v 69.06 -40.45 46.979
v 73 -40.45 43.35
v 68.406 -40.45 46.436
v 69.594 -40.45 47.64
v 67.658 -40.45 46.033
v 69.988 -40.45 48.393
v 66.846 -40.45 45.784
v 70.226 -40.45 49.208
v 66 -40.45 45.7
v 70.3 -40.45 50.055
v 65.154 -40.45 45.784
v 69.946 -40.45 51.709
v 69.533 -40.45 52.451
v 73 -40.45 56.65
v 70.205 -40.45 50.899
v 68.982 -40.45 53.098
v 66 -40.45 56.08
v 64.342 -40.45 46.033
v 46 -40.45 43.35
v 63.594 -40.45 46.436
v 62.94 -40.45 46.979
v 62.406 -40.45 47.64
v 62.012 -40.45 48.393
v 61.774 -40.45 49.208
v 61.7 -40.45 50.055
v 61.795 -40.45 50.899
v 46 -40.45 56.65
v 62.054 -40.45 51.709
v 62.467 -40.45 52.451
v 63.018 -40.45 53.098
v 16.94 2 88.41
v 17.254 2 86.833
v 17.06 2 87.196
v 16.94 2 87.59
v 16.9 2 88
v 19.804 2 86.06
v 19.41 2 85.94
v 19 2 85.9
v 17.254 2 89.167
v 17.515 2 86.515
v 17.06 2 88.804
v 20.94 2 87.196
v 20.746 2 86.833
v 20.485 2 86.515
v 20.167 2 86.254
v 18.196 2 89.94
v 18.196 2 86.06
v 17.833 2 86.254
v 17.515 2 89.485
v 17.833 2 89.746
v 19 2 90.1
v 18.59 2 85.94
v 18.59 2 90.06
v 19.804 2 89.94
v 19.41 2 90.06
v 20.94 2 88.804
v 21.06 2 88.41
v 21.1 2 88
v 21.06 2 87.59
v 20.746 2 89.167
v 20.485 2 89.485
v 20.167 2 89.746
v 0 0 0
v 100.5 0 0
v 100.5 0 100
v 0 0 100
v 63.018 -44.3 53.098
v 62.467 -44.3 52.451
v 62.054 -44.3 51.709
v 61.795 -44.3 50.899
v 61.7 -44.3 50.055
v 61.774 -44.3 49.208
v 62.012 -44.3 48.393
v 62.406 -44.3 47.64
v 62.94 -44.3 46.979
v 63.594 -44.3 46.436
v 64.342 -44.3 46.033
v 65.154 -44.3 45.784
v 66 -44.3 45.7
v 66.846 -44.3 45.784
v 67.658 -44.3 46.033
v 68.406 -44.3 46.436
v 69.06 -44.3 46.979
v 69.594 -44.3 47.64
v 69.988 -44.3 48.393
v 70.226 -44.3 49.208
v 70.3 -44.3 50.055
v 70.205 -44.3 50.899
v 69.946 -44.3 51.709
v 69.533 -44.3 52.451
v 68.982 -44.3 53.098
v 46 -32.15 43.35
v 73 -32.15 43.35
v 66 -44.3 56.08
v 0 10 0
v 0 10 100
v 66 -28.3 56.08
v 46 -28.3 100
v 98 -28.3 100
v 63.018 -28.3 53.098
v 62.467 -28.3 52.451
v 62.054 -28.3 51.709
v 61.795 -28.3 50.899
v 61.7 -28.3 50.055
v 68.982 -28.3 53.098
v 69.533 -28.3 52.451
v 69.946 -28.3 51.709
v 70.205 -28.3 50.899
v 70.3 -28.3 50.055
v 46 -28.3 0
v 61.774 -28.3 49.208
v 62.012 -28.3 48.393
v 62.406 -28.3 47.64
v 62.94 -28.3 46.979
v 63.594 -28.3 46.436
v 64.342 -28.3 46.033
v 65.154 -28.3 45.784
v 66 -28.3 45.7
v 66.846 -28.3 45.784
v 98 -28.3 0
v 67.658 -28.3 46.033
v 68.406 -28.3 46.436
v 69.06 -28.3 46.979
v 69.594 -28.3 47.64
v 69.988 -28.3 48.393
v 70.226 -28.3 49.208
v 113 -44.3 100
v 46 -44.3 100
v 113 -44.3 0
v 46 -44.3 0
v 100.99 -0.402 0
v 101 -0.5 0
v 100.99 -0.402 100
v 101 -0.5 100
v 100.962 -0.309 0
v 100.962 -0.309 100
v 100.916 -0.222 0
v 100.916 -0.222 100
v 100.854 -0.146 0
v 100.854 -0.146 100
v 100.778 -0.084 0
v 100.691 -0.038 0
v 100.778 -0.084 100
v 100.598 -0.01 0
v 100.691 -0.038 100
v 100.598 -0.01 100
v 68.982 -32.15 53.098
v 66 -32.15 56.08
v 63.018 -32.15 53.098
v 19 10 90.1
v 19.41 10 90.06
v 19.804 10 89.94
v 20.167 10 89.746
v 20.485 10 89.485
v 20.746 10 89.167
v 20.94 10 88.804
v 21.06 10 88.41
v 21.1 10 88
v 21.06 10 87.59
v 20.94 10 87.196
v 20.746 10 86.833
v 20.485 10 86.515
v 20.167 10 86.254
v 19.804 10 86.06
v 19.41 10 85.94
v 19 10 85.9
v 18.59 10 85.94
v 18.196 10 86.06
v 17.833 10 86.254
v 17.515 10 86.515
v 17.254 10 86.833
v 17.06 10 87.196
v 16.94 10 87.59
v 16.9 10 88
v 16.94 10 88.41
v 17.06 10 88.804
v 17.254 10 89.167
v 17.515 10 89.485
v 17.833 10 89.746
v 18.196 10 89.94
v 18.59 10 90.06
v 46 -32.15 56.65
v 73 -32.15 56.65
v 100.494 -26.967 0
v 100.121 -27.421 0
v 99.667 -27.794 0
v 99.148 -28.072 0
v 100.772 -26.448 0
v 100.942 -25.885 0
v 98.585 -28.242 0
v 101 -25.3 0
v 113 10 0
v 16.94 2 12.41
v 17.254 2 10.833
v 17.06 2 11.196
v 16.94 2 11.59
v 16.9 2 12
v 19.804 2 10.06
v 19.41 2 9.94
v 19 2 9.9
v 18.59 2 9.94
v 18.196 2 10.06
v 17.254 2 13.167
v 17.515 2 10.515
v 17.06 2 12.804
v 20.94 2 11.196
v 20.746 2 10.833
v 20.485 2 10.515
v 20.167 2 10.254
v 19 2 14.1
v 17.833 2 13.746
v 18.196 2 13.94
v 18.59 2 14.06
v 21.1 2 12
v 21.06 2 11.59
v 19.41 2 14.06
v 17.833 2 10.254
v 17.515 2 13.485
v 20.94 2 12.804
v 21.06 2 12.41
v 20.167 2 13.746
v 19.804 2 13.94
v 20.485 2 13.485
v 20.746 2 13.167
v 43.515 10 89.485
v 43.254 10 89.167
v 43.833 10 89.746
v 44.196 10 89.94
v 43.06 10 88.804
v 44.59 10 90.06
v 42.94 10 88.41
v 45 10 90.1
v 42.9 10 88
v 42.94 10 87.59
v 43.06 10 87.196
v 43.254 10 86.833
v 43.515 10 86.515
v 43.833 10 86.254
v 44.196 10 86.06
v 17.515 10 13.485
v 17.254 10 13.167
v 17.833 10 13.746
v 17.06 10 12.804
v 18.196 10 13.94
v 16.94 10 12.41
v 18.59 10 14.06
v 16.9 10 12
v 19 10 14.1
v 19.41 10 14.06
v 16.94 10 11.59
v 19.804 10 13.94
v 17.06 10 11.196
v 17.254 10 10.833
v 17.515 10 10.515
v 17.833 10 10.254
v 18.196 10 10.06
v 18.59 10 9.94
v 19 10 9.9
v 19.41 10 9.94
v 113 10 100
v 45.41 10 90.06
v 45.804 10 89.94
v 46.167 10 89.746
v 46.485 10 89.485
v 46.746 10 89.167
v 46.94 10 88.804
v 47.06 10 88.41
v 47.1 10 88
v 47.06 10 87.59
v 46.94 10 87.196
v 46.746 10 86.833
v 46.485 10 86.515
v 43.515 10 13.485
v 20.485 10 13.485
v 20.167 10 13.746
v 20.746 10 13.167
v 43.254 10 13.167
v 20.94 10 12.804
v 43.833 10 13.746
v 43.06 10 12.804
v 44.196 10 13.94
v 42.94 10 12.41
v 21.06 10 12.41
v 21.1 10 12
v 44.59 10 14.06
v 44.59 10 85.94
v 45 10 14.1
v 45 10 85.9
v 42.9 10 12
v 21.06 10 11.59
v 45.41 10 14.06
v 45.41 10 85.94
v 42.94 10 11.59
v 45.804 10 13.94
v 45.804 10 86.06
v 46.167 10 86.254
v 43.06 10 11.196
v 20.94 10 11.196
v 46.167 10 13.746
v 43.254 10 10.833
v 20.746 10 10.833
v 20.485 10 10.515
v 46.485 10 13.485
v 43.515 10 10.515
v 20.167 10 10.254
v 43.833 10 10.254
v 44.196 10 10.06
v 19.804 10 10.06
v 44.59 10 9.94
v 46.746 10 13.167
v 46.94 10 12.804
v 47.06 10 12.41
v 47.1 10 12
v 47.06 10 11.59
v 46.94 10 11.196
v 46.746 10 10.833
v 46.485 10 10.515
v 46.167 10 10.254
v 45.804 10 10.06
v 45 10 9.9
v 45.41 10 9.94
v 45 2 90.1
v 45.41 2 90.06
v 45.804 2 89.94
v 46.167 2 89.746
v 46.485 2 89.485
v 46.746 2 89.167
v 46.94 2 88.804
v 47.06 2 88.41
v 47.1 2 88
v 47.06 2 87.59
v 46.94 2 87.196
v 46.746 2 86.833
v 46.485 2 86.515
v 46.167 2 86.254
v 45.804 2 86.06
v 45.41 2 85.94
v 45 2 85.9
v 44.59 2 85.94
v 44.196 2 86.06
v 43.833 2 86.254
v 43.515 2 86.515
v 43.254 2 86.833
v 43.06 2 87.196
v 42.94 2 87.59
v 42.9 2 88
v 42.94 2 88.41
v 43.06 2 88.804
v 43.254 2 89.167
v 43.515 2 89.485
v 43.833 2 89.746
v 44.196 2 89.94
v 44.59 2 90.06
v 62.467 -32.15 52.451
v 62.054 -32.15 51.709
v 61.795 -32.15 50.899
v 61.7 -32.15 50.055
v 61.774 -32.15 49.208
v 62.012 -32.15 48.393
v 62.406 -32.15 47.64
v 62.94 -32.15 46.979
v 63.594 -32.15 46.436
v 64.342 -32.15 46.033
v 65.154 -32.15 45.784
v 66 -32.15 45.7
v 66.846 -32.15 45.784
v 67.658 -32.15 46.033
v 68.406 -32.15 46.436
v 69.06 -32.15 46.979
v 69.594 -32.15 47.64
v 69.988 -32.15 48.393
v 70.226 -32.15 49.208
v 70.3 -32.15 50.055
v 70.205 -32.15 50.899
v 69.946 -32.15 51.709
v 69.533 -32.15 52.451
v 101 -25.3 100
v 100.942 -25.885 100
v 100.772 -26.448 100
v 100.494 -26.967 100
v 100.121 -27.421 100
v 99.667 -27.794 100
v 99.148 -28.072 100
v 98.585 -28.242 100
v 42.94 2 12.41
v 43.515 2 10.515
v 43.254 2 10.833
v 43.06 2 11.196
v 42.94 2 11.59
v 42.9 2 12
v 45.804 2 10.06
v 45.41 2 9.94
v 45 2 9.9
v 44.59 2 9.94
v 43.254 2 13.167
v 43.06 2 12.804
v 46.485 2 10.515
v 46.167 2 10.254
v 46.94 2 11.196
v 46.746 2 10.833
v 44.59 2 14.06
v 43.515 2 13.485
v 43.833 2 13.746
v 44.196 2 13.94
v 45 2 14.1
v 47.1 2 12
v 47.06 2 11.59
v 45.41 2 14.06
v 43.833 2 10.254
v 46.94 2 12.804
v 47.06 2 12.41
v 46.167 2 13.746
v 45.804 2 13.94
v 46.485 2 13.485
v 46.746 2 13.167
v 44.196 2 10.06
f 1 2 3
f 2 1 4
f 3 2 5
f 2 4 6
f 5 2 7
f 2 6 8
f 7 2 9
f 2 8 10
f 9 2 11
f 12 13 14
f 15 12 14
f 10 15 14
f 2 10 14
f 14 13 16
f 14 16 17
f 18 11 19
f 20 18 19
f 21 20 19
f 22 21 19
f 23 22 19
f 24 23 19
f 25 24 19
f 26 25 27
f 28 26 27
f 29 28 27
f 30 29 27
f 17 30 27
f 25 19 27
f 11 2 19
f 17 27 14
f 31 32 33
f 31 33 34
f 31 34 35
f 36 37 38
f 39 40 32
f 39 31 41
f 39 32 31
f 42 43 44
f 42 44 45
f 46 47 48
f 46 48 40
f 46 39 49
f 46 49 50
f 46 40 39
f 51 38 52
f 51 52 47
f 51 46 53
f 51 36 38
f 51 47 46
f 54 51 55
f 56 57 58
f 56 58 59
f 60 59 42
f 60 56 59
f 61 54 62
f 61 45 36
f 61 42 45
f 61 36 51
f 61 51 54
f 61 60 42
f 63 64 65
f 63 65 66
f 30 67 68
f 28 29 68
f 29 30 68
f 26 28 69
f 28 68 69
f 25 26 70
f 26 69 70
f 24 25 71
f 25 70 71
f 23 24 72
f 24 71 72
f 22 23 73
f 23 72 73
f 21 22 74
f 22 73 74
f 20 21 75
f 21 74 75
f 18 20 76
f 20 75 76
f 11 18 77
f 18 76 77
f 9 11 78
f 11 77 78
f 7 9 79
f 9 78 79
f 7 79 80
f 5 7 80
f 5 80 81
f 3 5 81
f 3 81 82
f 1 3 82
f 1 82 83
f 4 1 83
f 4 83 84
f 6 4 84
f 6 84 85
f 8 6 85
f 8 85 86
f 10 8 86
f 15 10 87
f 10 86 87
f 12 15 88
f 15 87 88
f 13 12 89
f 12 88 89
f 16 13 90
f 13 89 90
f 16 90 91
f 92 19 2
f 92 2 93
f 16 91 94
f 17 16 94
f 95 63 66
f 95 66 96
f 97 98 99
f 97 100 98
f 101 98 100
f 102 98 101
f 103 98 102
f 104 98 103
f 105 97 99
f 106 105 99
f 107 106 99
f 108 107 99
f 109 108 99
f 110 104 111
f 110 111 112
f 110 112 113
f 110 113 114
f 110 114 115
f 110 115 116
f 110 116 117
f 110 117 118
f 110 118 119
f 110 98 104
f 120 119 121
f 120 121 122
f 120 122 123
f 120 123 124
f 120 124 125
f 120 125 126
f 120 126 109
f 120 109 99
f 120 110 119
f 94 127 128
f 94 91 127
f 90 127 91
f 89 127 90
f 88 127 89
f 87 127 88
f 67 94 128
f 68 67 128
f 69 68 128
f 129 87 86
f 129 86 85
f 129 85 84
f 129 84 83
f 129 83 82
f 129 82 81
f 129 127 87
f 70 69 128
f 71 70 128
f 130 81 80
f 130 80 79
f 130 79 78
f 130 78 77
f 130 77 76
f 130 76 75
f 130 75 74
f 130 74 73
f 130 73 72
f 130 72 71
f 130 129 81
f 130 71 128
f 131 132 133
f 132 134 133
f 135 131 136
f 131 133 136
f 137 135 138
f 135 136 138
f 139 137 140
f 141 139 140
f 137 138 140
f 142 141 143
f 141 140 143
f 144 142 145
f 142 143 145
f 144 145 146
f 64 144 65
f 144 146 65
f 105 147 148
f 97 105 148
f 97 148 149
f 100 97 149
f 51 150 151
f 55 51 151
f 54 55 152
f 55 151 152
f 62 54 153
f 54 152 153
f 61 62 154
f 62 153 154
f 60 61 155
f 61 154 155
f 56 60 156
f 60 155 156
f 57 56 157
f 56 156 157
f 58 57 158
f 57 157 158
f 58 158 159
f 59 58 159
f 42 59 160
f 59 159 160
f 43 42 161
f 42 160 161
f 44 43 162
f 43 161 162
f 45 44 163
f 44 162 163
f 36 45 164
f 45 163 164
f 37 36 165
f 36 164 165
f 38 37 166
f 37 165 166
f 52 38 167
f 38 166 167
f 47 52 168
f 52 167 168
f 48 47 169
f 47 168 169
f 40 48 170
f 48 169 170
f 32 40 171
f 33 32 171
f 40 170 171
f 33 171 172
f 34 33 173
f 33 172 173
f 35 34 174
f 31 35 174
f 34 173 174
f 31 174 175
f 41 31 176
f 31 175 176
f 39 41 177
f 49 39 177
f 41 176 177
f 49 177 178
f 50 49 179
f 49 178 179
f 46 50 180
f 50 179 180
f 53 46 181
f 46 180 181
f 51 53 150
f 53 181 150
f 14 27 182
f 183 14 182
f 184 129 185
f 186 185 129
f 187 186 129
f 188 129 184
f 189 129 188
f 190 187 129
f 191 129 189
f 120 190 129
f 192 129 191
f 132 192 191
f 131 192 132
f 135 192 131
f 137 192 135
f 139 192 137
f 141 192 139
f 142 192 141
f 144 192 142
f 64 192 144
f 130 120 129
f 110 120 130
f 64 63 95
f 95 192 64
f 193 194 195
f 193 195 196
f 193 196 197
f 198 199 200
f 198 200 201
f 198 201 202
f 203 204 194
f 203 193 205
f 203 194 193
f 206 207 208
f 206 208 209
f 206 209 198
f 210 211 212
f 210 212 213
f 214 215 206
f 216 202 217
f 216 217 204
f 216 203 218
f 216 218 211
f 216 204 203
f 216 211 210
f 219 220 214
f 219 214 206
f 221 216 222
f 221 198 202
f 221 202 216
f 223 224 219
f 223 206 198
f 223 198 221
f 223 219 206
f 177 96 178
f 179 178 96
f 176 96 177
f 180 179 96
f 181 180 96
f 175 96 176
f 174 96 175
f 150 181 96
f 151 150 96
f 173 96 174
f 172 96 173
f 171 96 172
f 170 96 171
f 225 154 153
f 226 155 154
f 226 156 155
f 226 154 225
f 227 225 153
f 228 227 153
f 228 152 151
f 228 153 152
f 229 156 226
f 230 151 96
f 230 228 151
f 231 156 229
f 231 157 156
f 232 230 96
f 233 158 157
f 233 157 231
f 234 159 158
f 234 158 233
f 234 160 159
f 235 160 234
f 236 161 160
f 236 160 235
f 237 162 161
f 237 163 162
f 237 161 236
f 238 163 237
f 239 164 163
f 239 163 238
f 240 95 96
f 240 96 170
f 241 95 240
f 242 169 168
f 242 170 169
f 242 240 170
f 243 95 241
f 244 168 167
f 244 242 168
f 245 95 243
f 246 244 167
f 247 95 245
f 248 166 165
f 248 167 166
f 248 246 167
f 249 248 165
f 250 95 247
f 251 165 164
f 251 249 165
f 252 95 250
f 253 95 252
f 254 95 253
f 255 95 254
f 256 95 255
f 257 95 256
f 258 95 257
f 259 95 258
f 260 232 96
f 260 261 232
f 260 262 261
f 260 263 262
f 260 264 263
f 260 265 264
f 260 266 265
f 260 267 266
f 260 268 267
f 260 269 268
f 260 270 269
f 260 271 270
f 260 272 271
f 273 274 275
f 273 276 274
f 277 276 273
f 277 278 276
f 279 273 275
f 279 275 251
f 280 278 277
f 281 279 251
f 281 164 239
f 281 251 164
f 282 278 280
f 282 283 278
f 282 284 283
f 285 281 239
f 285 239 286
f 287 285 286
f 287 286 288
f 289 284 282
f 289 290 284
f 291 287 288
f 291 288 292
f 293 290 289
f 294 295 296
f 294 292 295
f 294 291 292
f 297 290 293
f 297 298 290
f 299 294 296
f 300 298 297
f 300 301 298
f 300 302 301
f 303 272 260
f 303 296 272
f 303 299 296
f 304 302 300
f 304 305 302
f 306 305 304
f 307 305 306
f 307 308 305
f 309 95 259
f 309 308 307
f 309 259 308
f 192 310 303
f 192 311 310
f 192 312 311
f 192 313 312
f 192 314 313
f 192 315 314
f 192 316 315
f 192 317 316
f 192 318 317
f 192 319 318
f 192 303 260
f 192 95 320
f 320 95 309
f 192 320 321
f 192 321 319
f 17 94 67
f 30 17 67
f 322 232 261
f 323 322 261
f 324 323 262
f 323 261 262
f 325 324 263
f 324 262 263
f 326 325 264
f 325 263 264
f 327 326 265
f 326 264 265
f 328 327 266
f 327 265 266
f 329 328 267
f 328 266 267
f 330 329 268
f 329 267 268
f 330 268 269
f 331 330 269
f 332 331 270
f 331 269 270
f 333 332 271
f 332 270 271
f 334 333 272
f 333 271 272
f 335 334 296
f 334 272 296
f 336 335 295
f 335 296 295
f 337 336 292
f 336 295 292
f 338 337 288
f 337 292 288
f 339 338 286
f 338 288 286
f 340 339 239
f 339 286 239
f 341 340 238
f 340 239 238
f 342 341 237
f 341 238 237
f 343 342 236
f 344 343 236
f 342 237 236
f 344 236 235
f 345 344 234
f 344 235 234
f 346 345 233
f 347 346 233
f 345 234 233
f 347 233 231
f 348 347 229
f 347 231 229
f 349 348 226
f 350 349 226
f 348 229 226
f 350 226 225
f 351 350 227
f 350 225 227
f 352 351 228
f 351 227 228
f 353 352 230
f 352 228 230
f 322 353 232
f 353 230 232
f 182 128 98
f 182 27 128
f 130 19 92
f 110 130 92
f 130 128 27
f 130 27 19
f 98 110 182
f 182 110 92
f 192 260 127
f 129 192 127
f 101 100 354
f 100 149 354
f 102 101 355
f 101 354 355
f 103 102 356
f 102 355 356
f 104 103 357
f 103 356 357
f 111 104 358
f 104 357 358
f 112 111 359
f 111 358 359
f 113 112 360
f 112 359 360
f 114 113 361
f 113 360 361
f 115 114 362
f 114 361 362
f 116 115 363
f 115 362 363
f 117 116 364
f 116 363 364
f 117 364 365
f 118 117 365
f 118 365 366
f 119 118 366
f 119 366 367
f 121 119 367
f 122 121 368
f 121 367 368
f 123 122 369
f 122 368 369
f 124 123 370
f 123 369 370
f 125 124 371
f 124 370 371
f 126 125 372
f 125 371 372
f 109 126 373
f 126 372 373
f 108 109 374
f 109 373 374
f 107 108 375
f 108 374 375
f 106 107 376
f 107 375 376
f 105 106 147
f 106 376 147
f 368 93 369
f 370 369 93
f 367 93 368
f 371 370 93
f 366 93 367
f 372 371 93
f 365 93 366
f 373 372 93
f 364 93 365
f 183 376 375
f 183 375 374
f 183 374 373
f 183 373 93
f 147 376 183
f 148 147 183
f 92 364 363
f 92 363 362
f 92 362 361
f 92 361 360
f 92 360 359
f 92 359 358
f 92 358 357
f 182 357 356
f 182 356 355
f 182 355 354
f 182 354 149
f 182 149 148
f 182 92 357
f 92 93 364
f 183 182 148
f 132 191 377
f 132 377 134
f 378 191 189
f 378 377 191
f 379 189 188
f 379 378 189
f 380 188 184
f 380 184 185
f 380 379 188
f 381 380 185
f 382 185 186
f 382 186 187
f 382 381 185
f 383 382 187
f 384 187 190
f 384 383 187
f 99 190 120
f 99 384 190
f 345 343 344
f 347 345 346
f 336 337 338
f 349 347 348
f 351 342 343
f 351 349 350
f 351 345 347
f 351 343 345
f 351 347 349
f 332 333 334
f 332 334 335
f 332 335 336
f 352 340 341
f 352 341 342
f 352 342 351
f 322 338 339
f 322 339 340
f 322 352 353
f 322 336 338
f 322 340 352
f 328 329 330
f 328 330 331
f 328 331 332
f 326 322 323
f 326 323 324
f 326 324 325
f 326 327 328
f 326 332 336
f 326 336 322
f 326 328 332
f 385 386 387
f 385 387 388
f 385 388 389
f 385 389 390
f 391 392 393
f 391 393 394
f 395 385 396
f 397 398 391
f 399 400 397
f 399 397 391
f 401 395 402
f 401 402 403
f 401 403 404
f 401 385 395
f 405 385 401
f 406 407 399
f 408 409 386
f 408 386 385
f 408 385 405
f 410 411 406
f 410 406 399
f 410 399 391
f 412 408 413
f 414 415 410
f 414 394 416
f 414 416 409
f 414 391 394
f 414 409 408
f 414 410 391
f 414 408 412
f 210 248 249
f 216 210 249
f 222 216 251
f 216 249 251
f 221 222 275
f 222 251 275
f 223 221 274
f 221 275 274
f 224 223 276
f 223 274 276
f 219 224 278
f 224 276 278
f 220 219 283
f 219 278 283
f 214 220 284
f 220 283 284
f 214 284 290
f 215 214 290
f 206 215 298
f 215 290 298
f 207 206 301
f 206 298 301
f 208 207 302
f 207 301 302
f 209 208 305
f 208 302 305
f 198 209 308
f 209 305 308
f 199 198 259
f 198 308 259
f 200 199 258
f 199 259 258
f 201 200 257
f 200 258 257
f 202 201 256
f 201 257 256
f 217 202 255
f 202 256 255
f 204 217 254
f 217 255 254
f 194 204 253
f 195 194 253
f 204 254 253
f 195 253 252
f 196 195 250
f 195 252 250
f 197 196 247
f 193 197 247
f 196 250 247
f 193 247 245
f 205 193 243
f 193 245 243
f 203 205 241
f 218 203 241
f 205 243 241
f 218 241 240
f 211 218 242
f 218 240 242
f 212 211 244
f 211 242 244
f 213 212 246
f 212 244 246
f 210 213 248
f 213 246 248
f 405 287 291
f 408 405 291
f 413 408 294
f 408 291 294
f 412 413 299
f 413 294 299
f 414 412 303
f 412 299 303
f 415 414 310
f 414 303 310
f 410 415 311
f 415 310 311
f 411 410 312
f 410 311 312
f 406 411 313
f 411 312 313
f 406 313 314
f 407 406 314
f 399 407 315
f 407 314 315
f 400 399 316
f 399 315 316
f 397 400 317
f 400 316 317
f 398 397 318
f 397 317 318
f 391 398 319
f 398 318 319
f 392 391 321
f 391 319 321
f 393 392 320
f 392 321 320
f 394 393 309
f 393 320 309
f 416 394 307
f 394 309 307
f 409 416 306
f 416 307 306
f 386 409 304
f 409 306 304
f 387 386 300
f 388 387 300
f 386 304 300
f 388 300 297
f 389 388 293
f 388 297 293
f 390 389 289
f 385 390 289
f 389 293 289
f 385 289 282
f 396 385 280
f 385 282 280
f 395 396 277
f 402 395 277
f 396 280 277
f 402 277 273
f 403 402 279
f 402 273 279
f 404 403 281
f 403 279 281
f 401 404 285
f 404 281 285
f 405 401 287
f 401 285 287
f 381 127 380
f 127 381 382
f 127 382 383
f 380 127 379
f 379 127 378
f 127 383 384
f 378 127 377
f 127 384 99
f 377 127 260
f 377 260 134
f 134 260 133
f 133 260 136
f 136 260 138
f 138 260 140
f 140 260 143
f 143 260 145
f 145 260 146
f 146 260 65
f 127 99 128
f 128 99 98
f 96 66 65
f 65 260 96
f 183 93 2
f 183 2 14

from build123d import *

# Parameters (mm, degrees)
BOSS_EXTRUDE1_DEPTH = 100
SKETCH4_R           = 4.3
CUT_EXTRUDE1_DEPTH  = 16
SKETCH5_W           = 13.3
SKETCH5_H           = 8.3
CUT_EXTRUDE2_DEPTH  = 27
SKETCH3_R           = 2.1
CUT_EXTRUDE3_DEPTH  = 8
CUT_EXTRUDE4_DEPTH  = 16
FILLET1_R           = 3
FILLET2_R           = 0.5


with BuildPart() as part:
    # Sketch1 → Boss-Extrude1 (new body)
    with BuildSketch(Plane.XY):
        Polygon((0, 0), (0, 10), (113, 10), (113, -44.3), (46, -44.3), (46, -28.3), (101, -28.3), (101, 0), align=None)
    extrude(amount=BOSS_EXTRUDE1_DEPTH)

    # Sketch4 → Cut-Extrude1 (cut)
    with BuildSketch(Plane.XZ.offset(44.3)):
        with Locations((66, 50)):
            Circle(SKETCH4_R)
    extrude(amount=-CUT_EXTRUDE1_DEPTH, mode=Mode.SUBTRACT)

    # Sketch5 → Cut-Extrude2 (cut)
    with BuildSketch(Plane.ZY.offset(-46)):
        with Locations((50, -36.3)):
            Rectangle(SKETCH5_W, SKETCH5_H)
    extrude(amount=-CUT_EXTRUDE2_DEPTH, mode=Mode.SUBTRACT)

    # Sketch3 → Cut-Extrude3 (cut)
    with BuildSketch(Plane(origin=(0, 10, 0), x_dir=(1, 0, 0), z_dir=(0, 1, 0))):
        with Locations(Location((19, -12, 0), (0, 0, 270))):
            Circle(SKETCH3_R)
        with Locations(Location((19, -88, 0), (0, 0, 270))):
            Circle(SKETCH3_R)
        with Locations(Location((45, -12, 0), (0, 0, 270))):
            Circle(SKETCH3_R)
        with Locations(Location((45, -88, 0), (0, 0, 270))):
            Circle(SKETCH3_R)
    extrude(amount=-CUT_EXTRUDE3_DEPTH, mode=Mode.SUBTRACT)

    # Sketch6 → Cut-Extrude4 (cut)
    with BuildSketch(Plane.XZ.offset(44.3)):
        Polygon((66, 56.08), (62.96, 53.04), (66, 50), (69.04, 53.04), align=None)
    extrude(amount=-CUT_EXTRUDE4_DEPTH, mode=Mode.SUBTRACT)

    # Fillet1
    fillet1_edges = [part.edges().sort_by_distance(p)[0] for p in [
        (101, -28.3, 50),
    ]]
    fillet(fillet1_edges, radius=FILLET1_R)

    # Fillet2
    fillet2_edges = [part.edges().sort_by_distance(p)[0] for p in [
        (101, 0, 50),
    ]]
    fillet(fillet2_edges, radius=FILLET2_R)


solid = part.part
